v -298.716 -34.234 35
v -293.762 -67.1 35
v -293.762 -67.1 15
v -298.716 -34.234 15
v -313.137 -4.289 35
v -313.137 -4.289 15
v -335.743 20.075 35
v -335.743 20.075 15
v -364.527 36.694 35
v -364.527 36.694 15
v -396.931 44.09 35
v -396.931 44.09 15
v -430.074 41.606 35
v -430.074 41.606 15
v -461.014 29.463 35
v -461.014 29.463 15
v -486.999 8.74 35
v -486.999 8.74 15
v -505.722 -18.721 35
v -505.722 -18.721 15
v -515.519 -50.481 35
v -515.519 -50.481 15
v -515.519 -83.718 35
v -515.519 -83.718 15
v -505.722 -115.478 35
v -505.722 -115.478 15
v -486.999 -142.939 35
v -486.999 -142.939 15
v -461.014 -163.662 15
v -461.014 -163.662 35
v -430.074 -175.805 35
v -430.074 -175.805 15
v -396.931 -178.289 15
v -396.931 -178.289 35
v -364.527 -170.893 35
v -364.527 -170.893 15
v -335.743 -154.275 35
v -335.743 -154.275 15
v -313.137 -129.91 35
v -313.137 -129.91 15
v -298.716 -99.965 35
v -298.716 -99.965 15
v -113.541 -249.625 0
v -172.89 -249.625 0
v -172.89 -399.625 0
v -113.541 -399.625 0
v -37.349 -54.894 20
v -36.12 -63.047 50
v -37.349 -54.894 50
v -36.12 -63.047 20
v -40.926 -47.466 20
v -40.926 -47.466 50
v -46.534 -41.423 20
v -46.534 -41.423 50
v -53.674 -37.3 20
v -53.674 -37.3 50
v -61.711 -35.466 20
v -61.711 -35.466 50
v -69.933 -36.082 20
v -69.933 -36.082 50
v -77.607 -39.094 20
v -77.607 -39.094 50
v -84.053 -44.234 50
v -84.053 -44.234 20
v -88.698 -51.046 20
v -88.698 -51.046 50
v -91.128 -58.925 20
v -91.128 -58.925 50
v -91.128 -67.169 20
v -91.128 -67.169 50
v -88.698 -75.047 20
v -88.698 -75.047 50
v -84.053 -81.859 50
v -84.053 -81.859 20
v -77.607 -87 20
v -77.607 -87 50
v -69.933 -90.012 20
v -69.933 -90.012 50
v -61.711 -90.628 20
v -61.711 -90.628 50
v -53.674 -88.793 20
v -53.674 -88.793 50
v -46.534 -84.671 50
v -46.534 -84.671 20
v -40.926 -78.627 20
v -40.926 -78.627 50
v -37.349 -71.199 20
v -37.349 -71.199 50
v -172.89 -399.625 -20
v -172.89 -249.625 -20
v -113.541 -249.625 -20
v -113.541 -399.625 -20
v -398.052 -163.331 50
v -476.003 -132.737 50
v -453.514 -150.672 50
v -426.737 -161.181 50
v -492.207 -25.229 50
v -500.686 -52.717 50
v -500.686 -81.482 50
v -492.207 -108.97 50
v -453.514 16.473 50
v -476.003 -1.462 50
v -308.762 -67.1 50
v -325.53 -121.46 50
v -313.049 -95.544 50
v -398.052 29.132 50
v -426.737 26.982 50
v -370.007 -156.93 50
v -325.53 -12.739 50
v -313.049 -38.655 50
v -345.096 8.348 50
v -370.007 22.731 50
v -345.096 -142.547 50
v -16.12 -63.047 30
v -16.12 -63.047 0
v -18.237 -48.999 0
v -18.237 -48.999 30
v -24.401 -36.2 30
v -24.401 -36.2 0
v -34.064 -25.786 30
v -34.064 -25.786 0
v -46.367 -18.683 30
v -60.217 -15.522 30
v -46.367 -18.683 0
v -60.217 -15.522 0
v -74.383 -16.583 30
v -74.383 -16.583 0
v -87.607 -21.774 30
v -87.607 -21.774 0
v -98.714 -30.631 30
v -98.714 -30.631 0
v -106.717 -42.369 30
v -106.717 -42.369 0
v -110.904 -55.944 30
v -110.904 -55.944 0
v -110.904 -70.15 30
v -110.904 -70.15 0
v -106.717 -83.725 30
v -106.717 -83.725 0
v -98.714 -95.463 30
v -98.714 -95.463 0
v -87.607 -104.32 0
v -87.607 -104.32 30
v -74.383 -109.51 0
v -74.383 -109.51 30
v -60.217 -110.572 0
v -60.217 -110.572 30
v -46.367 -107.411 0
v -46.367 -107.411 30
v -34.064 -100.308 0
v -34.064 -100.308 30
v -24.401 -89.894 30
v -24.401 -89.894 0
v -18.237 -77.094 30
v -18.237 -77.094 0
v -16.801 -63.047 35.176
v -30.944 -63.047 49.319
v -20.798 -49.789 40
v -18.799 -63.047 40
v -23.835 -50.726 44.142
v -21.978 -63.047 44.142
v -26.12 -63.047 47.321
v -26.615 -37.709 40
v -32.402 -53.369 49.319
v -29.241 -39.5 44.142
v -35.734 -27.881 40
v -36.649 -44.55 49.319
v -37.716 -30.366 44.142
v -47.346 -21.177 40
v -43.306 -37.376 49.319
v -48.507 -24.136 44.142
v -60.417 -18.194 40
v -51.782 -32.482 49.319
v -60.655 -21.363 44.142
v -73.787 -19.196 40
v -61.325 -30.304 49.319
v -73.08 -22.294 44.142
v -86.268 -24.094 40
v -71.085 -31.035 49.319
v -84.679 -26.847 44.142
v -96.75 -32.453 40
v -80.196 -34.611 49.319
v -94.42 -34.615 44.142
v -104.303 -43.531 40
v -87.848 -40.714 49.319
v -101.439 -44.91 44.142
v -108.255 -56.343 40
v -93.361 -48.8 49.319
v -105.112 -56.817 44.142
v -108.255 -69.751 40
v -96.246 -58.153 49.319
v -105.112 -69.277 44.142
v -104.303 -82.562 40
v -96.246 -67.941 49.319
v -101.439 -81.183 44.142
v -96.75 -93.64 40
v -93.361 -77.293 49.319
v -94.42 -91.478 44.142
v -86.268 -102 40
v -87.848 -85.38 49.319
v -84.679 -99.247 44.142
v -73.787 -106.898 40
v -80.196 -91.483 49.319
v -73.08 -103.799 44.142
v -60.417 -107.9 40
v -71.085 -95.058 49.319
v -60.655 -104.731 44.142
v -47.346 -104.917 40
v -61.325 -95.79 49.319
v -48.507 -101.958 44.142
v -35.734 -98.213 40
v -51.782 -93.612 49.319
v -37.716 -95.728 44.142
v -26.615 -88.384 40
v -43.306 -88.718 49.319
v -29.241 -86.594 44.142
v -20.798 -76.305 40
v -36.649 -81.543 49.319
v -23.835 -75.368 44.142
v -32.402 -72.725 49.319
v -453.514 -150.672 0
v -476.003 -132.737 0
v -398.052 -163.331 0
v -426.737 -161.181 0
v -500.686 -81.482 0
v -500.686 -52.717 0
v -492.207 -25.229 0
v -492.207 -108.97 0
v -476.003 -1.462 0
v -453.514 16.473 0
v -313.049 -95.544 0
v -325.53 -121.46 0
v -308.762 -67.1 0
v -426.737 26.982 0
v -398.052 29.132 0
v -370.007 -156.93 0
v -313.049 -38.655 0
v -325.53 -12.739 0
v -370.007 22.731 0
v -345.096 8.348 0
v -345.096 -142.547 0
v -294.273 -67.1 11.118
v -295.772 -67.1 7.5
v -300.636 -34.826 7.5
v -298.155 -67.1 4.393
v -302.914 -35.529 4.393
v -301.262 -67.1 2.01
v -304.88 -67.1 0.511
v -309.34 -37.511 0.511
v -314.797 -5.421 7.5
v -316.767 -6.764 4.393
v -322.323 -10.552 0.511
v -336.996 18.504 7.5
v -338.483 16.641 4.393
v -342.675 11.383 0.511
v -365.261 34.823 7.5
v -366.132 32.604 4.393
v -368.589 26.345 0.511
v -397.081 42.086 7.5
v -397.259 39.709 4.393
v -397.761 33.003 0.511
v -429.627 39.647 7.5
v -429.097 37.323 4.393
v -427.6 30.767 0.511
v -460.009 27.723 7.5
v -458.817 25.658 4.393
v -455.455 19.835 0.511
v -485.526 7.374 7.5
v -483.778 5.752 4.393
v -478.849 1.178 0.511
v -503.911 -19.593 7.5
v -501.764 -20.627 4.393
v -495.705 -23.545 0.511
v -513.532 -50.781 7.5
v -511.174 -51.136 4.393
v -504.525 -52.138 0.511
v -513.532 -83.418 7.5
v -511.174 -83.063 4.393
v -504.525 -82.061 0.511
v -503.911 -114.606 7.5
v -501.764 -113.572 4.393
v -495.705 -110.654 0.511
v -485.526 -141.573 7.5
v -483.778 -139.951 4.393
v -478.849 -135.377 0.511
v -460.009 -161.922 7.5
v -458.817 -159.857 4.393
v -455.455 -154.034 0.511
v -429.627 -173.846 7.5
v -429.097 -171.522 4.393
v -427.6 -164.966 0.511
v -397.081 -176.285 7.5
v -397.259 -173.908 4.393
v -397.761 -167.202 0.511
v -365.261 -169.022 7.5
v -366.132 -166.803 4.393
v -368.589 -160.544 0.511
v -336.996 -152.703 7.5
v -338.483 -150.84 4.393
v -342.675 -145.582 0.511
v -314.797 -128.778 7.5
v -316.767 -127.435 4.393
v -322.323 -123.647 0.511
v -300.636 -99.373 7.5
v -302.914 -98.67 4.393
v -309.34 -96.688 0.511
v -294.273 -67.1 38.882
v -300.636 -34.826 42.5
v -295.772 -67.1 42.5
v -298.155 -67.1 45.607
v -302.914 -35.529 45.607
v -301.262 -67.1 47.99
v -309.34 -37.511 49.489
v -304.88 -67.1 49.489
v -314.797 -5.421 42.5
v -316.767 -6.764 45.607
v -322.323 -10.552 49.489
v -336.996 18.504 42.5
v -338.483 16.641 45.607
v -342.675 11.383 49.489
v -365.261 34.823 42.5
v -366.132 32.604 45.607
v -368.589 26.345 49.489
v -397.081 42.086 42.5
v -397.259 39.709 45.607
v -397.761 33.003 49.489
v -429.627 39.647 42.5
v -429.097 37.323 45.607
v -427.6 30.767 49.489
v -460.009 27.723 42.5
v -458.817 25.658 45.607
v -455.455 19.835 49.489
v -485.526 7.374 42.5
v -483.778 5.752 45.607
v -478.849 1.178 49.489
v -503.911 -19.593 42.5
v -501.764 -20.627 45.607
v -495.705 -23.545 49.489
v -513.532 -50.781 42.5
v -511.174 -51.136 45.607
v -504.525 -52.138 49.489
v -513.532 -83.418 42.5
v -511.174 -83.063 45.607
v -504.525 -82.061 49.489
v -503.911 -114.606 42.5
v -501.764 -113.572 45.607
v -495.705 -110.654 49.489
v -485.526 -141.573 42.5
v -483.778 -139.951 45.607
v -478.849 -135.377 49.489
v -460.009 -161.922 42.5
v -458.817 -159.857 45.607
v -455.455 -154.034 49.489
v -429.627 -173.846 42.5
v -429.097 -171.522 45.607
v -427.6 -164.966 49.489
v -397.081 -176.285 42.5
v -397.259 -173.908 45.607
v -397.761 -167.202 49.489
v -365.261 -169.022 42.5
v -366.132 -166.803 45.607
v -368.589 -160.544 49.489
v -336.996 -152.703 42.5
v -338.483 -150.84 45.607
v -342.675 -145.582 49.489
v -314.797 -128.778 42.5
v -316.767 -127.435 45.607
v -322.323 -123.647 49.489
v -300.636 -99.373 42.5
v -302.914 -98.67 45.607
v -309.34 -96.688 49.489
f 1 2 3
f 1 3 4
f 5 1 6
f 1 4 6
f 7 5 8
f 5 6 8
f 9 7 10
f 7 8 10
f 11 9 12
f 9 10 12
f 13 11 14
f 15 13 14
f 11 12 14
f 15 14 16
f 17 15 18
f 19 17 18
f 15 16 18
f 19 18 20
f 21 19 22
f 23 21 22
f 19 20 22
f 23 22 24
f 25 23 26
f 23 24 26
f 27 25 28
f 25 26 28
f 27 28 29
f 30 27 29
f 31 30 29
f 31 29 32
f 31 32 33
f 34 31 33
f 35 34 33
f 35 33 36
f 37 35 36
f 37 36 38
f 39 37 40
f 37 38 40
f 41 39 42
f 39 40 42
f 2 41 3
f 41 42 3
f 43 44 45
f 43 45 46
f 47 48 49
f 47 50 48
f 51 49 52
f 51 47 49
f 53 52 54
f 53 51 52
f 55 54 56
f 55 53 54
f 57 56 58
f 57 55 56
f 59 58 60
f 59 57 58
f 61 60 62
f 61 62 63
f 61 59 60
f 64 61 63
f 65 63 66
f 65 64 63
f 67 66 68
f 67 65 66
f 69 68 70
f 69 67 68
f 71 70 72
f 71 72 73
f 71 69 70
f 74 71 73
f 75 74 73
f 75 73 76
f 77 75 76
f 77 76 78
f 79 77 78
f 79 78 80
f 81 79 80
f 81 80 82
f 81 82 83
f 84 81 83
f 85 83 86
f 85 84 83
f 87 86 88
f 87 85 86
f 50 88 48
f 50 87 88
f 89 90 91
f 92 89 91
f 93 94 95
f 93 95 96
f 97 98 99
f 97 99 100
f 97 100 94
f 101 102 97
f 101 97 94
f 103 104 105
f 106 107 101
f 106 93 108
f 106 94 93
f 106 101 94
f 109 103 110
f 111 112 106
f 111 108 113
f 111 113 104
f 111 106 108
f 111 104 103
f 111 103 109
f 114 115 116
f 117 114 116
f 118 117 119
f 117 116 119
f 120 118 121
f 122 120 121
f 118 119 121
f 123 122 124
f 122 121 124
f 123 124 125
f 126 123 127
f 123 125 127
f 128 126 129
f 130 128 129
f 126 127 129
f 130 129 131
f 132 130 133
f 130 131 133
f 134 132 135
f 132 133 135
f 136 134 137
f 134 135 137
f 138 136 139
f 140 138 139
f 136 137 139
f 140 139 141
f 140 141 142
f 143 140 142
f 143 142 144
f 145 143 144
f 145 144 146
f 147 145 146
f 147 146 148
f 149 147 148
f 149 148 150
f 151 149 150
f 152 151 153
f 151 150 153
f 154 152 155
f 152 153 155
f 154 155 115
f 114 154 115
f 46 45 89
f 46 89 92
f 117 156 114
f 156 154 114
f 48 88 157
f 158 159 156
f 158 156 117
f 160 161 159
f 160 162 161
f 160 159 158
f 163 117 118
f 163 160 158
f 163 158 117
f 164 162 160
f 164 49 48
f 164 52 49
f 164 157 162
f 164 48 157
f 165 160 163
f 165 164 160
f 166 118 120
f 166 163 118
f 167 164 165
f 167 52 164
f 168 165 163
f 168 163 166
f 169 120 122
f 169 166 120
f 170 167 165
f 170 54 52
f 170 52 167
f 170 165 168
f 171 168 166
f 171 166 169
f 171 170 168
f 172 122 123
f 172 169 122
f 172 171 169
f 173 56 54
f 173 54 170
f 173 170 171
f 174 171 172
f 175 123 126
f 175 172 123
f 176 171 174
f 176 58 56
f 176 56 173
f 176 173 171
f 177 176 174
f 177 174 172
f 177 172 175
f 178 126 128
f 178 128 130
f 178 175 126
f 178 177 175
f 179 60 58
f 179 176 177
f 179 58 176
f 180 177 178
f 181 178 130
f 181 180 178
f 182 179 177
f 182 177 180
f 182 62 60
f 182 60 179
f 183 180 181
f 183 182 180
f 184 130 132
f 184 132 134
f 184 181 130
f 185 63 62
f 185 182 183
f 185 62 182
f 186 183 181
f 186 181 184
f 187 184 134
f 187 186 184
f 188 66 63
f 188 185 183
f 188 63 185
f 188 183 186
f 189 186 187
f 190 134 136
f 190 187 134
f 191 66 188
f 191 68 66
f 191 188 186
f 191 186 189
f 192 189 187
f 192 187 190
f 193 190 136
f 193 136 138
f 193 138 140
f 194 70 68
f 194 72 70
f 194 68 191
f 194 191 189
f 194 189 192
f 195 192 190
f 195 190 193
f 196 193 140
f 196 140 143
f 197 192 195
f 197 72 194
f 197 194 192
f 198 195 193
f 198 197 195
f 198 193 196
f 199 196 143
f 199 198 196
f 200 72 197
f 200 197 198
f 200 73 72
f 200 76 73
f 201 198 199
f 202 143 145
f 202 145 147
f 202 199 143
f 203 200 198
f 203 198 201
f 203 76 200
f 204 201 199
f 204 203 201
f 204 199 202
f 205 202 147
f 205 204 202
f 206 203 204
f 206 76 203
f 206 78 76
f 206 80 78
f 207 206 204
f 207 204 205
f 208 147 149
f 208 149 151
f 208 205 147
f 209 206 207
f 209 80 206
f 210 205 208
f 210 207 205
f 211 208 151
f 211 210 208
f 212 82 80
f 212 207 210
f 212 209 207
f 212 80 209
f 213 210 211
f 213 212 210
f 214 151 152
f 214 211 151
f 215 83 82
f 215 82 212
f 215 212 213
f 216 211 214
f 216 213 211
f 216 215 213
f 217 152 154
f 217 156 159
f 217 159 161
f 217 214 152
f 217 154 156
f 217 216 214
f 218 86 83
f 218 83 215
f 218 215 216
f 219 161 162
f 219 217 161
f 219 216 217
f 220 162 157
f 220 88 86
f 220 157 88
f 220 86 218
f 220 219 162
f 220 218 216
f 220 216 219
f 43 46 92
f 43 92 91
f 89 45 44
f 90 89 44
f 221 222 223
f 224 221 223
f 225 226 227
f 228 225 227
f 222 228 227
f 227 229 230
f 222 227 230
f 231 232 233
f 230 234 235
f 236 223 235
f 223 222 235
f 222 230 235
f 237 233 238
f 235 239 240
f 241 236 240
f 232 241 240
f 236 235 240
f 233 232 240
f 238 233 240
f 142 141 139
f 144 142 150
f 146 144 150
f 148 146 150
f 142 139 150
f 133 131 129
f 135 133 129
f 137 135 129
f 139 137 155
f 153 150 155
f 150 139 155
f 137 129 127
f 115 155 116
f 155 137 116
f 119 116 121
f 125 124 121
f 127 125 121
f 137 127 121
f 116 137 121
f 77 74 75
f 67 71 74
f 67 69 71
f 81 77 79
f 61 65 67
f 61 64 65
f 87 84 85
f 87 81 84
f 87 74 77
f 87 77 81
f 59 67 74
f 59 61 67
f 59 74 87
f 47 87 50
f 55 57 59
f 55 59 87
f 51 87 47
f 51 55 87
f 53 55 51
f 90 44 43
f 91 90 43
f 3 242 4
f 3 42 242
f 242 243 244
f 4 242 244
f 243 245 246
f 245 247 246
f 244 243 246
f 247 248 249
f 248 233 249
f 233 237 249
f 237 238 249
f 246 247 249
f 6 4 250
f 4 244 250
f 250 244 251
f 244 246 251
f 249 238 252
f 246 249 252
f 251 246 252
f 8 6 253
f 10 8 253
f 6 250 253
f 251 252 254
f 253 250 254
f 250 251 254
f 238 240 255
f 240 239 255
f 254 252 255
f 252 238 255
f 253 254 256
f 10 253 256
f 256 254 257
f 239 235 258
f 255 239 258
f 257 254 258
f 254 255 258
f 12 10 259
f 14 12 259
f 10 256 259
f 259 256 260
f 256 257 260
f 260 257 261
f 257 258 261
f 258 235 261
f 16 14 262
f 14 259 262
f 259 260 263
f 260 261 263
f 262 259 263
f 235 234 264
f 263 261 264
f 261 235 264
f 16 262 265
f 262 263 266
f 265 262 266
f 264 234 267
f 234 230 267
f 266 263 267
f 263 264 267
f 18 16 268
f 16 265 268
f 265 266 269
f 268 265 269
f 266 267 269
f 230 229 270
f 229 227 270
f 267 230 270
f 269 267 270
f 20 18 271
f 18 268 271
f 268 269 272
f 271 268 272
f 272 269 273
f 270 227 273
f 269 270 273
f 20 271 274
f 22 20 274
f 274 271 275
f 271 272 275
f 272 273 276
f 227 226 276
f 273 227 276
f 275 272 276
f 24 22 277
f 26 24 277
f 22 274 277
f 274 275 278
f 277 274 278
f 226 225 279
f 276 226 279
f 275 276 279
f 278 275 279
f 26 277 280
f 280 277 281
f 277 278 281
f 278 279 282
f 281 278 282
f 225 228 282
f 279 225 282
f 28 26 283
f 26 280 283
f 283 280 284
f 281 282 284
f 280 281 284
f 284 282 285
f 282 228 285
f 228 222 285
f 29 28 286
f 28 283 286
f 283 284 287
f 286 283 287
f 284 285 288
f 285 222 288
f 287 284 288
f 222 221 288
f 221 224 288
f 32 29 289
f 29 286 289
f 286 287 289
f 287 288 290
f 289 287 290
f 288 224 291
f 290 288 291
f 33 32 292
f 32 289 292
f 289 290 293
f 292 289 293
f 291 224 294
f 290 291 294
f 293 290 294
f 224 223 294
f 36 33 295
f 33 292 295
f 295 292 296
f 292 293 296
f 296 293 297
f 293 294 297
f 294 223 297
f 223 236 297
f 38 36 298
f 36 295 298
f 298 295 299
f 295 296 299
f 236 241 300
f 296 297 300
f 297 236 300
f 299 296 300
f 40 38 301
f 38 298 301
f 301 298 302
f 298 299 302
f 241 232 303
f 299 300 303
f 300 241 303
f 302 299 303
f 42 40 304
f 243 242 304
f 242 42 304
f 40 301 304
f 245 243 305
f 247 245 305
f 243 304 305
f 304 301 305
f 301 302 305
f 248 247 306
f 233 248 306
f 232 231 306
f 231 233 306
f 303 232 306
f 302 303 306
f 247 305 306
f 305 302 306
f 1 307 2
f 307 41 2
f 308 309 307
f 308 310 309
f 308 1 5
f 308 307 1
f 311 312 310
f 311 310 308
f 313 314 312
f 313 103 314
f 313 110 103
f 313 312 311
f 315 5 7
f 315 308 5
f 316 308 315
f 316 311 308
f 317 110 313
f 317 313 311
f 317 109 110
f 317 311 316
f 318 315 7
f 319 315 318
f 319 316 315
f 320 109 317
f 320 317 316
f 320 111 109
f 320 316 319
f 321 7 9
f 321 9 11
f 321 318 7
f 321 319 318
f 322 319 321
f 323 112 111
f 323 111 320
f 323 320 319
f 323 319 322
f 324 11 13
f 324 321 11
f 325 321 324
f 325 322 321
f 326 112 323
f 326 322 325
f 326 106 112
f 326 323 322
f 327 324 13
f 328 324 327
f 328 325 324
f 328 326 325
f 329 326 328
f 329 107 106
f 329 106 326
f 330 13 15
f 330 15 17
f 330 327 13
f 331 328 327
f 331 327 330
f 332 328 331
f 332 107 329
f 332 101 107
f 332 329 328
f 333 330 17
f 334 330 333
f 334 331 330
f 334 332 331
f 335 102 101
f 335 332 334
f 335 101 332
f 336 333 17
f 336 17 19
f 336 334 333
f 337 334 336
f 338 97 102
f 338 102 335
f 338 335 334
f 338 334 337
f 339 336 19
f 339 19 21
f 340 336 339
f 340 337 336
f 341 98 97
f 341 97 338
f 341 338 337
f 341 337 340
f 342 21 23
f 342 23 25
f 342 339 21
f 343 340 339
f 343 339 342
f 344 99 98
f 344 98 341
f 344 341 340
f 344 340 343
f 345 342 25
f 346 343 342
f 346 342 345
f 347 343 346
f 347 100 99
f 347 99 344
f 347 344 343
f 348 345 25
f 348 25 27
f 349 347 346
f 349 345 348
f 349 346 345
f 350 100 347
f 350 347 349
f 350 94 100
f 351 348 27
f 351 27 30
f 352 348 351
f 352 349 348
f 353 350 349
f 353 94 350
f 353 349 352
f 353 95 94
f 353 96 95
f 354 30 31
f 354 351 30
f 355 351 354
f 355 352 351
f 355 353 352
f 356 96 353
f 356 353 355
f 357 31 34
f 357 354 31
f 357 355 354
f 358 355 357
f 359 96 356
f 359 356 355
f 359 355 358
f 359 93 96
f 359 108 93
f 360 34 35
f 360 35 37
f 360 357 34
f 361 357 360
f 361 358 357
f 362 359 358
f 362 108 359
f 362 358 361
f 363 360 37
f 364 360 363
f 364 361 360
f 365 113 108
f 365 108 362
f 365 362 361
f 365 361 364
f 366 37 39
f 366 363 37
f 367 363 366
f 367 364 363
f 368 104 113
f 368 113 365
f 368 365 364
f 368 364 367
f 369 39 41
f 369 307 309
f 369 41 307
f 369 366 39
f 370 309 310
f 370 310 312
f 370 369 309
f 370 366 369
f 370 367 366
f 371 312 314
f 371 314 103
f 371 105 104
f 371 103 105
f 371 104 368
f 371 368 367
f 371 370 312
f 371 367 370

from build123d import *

# Parameters (mm, degrees)
F0_W     = 59.3491444241
F0_H     = 150
F1_DEPTH = 20
F2_R     = 47.6583720873
F3_DEPTH = 50
F4_R     = 20
F5_T     = -20
F6_R     = 111.5009996007
F7_DEPTH = 50
F8_R     = 15
F9_R     = 15


# Not quite as in the source:
# - a shell that OpenCascade refuses in one call is made with other operations: the cavity is built on its own and cut out


with BuildPart() as f1:
    # F0 (on Top) → F1 (new body)
    with BuildSketch(Plane.XY):
        with Locations((-143.2152688503, -324.6246539056)):
            Rectangle(F0_W, F0_H)
    extrude(amount=-F1_DEPTH)


with BuildPart() as f3:
    # F2 (on Top) → F3 (new body)
    with BuildSketch(Plane.XY):
        with Locations((-63.7783035636, -63.0468800664)):
            Circle(F2_R)
    extrude(amount=F3_DEPTH)

    # F4
    f4_edges = [f3.edges().sort_by_distance(p)[0] for p in [
        (-111.436676, -63.04688, 50),
    ]]
    fillet(f4_edges, radius=F4_R)

    # F5: a shell. OpenCascade refuses it in one call, so the cavity is built on its own and cut out:
    # the body offset inwards by the wall thickness, plus a prism from it out through each open face.
    f5_core = offset(f3.part, amount=F5_T, kind=Kind.INTERSECTION, mode=Mode.PRIVATE)
    f5_exits = [f5_core.faces().sort_by_distance(p)[0] for p in [
        (-63.778304, -63.04688, 30),
    ]]
    add(f5_core, mode=Mode.SUBTRACT)
    extrude(f5_exits, amount=-F5_T, mode=Mode.SUBTRACT)


with BuildPart() as f7:
    # F6 (on Top) → F7 (new body)
    with BuildSketch(Plane.XY):
        with Locations((-405.2630662918, -67.0995116234)):
            Circle(F6_R)
    extrude(amount=F7_DEPTH)

    # F8
    f8_edges = [f7.edges().sort_by_distance(p)[0] for p in [
        (-516.764066, -67.099512, 50),
    ]]
    fillet(f8_edges, radius=F8_R)

    # F9
    f9_edges = [f7.edges().sort_by_distance(p)[0] for p in [
        (-516.764066, -67.099512, 0),
    ]]
    fillet(f9_edges, radius=F9_R)


solid = Compound([f1.part, f3.part, f7.part])
